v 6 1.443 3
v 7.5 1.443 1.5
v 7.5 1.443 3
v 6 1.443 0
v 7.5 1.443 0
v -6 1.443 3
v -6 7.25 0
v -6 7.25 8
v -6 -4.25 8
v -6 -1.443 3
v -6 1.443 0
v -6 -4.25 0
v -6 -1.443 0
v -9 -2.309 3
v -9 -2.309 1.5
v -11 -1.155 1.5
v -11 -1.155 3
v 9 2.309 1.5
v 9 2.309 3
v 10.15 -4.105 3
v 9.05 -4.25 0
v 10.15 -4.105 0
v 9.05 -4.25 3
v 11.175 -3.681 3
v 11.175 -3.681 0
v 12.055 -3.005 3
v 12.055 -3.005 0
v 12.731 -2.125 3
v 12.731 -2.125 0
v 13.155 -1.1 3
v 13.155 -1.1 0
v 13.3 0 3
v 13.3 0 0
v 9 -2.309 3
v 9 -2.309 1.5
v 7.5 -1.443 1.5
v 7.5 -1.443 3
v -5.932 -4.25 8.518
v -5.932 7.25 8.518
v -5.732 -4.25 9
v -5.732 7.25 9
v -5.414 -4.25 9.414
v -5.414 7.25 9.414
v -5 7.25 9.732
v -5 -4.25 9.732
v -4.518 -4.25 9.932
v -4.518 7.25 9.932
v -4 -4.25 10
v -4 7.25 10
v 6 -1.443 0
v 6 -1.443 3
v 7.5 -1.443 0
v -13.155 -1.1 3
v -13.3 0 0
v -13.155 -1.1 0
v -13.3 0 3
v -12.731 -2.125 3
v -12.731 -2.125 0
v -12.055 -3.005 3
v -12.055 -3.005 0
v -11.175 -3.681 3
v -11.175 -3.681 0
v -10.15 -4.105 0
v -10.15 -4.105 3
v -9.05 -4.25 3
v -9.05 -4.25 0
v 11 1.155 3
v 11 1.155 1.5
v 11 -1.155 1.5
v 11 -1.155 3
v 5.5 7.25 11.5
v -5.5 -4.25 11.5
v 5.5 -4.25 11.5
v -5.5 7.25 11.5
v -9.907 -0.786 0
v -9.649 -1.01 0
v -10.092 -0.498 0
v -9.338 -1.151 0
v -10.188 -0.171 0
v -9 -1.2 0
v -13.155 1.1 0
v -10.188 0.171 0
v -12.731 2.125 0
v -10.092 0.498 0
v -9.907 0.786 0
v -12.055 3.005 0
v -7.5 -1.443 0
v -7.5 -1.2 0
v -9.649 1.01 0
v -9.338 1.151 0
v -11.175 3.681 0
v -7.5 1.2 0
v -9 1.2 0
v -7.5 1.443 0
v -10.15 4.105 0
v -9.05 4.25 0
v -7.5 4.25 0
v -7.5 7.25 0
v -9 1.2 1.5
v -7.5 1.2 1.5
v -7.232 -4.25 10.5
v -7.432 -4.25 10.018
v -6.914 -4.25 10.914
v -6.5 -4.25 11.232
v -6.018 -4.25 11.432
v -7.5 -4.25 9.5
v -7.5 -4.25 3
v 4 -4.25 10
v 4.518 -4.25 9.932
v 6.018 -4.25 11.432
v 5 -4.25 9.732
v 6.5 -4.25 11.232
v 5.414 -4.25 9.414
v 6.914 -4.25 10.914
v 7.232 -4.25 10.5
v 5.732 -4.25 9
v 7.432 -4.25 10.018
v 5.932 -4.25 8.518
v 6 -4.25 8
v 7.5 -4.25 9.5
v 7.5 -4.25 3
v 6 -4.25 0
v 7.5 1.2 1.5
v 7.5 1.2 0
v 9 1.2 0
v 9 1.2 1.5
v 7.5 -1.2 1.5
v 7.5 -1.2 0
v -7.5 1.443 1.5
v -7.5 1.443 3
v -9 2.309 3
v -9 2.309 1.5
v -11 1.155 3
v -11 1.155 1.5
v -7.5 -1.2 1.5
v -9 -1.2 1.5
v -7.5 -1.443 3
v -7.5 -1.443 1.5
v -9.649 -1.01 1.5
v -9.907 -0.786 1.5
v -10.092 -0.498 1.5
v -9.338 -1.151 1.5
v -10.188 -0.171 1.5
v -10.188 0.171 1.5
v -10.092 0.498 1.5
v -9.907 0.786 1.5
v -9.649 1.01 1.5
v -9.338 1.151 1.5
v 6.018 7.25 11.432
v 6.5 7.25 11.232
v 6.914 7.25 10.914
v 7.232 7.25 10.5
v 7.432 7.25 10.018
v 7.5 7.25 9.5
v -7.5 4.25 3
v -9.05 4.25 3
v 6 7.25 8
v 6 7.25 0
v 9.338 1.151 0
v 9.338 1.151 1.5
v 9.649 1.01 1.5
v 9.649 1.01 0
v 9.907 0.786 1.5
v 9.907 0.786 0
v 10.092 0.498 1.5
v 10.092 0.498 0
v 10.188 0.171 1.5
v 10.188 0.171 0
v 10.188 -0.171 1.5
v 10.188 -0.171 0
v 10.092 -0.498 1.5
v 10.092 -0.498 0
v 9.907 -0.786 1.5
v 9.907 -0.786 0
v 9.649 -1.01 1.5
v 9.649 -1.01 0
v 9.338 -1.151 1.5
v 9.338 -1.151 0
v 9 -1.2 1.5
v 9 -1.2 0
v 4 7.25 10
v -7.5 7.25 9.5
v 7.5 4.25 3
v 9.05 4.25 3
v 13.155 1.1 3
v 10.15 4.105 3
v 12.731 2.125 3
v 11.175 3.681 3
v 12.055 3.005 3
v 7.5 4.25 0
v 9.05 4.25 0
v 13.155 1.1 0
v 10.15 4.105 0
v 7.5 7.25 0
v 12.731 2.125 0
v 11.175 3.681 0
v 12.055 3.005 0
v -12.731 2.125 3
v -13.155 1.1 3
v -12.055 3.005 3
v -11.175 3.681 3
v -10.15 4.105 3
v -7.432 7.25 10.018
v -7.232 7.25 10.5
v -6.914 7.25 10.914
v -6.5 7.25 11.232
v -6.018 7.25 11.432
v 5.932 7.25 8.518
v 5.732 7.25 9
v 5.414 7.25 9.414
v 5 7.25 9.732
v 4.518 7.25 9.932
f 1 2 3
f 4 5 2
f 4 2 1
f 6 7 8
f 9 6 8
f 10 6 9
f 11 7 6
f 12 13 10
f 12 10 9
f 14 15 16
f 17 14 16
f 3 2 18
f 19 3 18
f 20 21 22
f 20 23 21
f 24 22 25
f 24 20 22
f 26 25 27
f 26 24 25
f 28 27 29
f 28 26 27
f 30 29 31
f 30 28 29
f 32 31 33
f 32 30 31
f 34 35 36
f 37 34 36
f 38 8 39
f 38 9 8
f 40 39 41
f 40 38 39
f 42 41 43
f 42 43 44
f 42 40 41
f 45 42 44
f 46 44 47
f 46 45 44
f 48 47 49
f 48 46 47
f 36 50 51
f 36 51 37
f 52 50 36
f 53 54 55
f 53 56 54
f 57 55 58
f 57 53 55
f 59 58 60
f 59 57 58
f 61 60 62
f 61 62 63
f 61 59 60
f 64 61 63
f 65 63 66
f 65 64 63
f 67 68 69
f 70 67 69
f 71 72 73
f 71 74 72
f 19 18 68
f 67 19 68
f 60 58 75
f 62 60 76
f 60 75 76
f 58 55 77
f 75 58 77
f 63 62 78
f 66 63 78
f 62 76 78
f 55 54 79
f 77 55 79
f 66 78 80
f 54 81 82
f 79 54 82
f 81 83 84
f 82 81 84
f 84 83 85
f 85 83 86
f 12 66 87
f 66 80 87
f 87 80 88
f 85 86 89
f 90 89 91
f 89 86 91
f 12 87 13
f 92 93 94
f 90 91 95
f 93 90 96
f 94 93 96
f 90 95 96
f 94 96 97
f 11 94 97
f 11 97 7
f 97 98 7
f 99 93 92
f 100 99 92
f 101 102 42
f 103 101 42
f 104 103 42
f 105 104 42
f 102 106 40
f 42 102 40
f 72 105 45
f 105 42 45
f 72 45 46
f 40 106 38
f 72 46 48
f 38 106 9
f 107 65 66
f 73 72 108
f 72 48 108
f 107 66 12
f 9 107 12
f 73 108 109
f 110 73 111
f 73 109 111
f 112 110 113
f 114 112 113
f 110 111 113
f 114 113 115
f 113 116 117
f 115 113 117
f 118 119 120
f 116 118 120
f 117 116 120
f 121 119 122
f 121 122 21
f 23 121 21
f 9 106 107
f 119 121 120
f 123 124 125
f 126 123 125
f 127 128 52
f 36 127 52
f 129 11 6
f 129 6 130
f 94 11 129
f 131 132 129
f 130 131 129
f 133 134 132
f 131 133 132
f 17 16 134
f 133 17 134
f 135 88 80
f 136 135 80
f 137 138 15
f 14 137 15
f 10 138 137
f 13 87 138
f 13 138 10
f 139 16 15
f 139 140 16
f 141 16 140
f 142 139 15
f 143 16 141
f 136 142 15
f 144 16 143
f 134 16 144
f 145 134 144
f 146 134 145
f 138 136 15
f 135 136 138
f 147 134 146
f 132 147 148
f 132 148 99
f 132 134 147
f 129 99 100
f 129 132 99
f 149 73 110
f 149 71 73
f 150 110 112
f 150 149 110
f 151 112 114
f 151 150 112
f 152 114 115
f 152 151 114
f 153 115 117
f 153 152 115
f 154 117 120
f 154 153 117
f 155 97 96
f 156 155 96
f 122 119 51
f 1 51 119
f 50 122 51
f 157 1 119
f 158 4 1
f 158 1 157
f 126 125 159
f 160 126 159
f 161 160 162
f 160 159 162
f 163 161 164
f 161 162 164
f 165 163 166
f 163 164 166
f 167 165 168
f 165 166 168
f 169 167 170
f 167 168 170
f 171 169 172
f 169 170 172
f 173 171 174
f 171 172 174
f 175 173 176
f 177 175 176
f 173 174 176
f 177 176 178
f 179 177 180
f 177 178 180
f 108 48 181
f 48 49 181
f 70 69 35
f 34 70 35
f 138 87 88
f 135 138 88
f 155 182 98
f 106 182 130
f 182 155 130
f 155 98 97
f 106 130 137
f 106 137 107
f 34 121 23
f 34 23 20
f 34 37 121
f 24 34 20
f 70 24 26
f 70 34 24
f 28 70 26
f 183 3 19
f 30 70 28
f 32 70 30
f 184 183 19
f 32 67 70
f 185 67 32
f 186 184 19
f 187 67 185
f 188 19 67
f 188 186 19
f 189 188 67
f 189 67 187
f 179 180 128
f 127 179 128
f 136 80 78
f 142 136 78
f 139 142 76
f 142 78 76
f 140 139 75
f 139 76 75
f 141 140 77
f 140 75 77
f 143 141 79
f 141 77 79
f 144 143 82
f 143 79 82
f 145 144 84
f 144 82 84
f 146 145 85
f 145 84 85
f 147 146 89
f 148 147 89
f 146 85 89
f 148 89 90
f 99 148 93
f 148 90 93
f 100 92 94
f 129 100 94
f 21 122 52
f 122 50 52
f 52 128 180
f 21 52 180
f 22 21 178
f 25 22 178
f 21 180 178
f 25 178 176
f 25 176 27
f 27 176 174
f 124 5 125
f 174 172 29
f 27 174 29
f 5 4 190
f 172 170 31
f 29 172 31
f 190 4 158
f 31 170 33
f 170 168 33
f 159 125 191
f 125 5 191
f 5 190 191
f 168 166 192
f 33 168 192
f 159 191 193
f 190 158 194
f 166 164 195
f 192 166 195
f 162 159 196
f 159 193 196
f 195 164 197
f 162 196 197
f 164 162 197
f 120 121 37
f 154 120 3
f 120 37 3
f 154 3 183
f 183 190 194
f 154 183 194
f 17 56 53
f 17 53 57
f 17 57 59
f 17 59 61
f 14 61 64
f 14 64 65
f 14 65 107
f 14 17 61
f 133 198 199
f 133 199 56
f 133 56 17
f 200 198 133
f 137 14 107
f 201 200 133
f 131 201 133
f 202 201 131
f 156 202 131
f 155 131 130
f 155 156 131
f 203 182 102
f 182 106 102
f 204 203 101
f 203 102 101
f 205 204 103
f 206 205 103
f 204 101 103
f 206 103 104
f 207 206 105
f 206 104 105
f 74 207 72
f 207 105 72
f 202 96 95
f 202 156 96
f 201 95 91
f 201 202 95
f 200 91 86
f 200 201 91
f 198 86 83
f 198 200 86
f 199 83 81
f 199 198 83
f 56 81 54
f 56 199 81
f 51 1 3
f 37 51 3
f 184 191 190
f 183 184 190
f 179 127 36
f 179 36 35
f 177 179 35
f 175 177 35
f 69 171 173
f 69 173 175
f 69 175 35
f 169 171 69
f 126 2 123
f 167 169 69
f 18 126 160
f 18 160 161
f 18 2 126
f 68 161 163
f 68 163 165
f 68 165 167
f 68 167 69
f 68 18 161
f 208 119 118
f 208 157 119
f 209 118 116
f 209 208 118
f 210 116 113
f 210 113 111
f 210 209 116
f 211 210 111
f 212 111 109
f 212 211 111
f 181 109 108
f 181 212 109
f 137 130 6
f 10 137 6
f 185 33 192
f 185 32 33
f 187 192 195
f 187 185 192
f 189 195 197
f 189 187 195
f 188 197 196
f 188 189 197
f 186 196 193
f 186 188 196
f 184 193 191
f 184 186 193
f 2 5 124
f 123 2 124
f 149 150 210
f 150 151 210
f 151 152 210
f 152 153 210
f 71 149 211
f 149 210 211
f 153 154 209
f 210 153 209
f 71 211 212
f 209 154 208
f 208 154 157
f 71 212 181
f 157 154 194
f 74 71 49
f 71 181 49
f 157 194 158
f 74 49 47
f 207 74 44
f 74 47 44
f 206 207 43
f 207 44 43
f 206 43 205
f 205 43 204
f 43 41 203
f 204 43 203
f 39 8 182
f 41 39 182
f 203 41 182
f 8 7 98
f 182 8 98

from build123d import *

# Parameters (mm, degrees)
F0_W     = 1.5
F0_H     = 2.806624327
F1_DEPTH = 11.5
F2_DEPTH = 10
F3_DEPTH = 3
F4_DEPTH = 3
F5_DEPTH = 1.5
F6_R     = 4.24999
F7_R     = 2


# Not quite as in the source:
# - a fillet or chamfer is up to 0.001 mm smaller than in the source, because OpenCascade refuses the exact size


with BuildPart() as f1:
    # F0 (on Top) → F1 (new body)
    with BuildSketch(Plane.XY):
        Polygon((-6, 7.25), (-6, 1.443375673), (-6, -1.443375673), (-6, -4.25), (0, -4.25), (0, 7.25), align=None)
        Polygon((-7.5, 4.25), (-7.5, 1.443375673), (-6, 1.443375673), (-6, 7.25), (-7.5, 7.25), align=None)
        Polygon((-7.5, 1.443375673), (-7.5, 1.1999995727), (-7.5, -1.1999995727), (-7.5, -1.443375673), (-6, -1.443375673), (-6, 1.443375673), align=None)
        with Locations((-6.75, -2.8466878365)):
            Rectangle(F0_W, F0_H)
        Polygon((6, 7.25), (0, 7.25), (0, -4.25), (6, -4.25), (6, -1.443375673), (6, 1.443375673), align=None)
        Polygon((7.5, 7.25), (6, 7.25), (6, 1.443375673), (7.5, 1.443375673), (7.5, 4.25), align=None)
        Polygon((7.5, 1.443375673), (6, 1.443375673), (6, -1.443375673), (7.5, -1.443375673), (7.5, -1.1999995727), (7.5, 1.1999995727), align=None)
        with Locations((6.75, -2.8466878365)):
            Rectangle(F0_W, F0_H)
    extrude(amount=F1_DEPTH)

    # F0 (on Top) → F2 (cut)
    with BuildSketch(Plane.XY):
        Polygon((-6, 7.25), (-6, 1.443375673), (-6, -1.443375673), (-6, -4.25), (0, -4.25), (0, 7.25), align=None)
        Polygon((6, 7.25), (0, 7.25), (0, -4.25), (6, -4.25), (6, -1.443375673), (6, 1.443375673), align=None)
    extrude(amount=F2_DEPTH, mode=Mode.SUBTRACT)

    # F0 (on Top) → F3 (cut)
    with BuildSketch(Plane.XY):
        Polygon((-7.5, 1.443375673), (-7.5, 1.1999995727), (-7.5, -1.1999995727), (-7.5, -1.443375673), (-6, -1.443375673), (-6, 1.443375673), align=None)
        Polygon((7.5, 1.443375673), (6, 1.443375673), (6, -1.443375673), (7.5, -1.443375673), (7.5, -1.1999995727), (7.5, 1.1999995727), align=None)
    extrude(amount=F3_DEPTH, mode=Mode.SUBTRACT)

    # F0 (on Top) → F4 (join)
    with BuildSketch(Plane.XY):
        Polygon((-9, 2.3094010768), (-7.5, 1.443375673), (-7.5, 4.25), (-13.3, 4.25), (-13.3, -4.25), (-7.5, -4.25), (-7.5, -1.443375673), (-9, -2.3094010768), (-11, -1.1547005384), (-11, 1.1547005384), align=None)
        Polygon((7.5, -1.443375673), (7.5, -4.25), (13.3, -4.25), (13.3, 4.25), (7.5, 4.25), (7.5, 1.443375673), (9, 2.3094010768), (11, 1.1547005384), (11, -1.1547005384), (9, -2.3094010768), align=None)
    extrude(amount=F4_DEPTH)

    # F0 (on Top) → F5 (join)
    with BuildSketch(Plane.XY):
        with BuildLine():
            ThreePointArc((-9, -1.1999995727), (-10.1999995727, 0), (-9, 1.1999995727))
            Line((-9, 1.1999995727), (-7.5, 1.1999995727))
            Line((-7.5, 1.1999995727), (-7.5, 1.443375673))
            Line((-7.5, 1.443375673), (-9, 2.3094010768))
            Line((-9, 2.3094010768), (-11, 1.1547005384))
            Line((-11, 1.1547005384), (-11, -1.1547005384))
            Line((-11, -1.1547005384), (-9, -2.3094010768))
            Line((-9, -2.3094010768), (-7.5, -1.443375673))
            Line((-7.5, -1.443375673), (-7.5, -1.1999995727))
            Line((-7.5, -1.1999995727), (-9, -1.1999995727))
        make_face()
        with BuildLine():
            Line((9, 2.3094010768), (7.5, 1.443375673))
            Line((7.5, 1.443375673), (7.5, 1.1999995727))
            Line((7.5, 1.1999995727), (9, 1.1999995727))
            ThreePointArc((9, 1.1999995727), (10.1999995727, 0), (9, -1.1999995727))
            Line((9, -1.1999995727), (7.5, -1.1999995727))
            Line((7.5, -1.1999995727), (7.5, -1.443375673))
            Line((7.5, -1.443375673), (9, -2.3094010768))
            Line((9, -2.3094010768), (11, -1.1547005384))
            Line((11, -1.1547005384), (11, 1.1547005384))
            Line((11, 1.1547005384), (9, 2.3094010768))
        make_face()
    extrude(amount=F5_DEPTH)

    # F6 (radius 4.25 in the source; OpenCascade refuses exactly that, so slightly less here)
    f6_edges = [f1.edges().sort_by_distance(p)[0] for p in [
        (-13.3, -4.25, 1.5),
        (-13.3, 4.25, 1.5),
        (13.3, 4.25, 1.5),
        (13.3, -4.25, 1.5),
    ]]
    fillet(f6_edges, radius=F6_R)

    # F7
    f7_edges = [f1.edges().sort_by_distance(p)[0] for p in [
        (6, 1.5, 10),
        (7.5, 1.5, 11.5),
        (-7.5, 1.5, 11.5),
        (-6, 1.5, 10),
    ]]
    fillet(f7_edges, radius=F7_R)


solid = f1.part
